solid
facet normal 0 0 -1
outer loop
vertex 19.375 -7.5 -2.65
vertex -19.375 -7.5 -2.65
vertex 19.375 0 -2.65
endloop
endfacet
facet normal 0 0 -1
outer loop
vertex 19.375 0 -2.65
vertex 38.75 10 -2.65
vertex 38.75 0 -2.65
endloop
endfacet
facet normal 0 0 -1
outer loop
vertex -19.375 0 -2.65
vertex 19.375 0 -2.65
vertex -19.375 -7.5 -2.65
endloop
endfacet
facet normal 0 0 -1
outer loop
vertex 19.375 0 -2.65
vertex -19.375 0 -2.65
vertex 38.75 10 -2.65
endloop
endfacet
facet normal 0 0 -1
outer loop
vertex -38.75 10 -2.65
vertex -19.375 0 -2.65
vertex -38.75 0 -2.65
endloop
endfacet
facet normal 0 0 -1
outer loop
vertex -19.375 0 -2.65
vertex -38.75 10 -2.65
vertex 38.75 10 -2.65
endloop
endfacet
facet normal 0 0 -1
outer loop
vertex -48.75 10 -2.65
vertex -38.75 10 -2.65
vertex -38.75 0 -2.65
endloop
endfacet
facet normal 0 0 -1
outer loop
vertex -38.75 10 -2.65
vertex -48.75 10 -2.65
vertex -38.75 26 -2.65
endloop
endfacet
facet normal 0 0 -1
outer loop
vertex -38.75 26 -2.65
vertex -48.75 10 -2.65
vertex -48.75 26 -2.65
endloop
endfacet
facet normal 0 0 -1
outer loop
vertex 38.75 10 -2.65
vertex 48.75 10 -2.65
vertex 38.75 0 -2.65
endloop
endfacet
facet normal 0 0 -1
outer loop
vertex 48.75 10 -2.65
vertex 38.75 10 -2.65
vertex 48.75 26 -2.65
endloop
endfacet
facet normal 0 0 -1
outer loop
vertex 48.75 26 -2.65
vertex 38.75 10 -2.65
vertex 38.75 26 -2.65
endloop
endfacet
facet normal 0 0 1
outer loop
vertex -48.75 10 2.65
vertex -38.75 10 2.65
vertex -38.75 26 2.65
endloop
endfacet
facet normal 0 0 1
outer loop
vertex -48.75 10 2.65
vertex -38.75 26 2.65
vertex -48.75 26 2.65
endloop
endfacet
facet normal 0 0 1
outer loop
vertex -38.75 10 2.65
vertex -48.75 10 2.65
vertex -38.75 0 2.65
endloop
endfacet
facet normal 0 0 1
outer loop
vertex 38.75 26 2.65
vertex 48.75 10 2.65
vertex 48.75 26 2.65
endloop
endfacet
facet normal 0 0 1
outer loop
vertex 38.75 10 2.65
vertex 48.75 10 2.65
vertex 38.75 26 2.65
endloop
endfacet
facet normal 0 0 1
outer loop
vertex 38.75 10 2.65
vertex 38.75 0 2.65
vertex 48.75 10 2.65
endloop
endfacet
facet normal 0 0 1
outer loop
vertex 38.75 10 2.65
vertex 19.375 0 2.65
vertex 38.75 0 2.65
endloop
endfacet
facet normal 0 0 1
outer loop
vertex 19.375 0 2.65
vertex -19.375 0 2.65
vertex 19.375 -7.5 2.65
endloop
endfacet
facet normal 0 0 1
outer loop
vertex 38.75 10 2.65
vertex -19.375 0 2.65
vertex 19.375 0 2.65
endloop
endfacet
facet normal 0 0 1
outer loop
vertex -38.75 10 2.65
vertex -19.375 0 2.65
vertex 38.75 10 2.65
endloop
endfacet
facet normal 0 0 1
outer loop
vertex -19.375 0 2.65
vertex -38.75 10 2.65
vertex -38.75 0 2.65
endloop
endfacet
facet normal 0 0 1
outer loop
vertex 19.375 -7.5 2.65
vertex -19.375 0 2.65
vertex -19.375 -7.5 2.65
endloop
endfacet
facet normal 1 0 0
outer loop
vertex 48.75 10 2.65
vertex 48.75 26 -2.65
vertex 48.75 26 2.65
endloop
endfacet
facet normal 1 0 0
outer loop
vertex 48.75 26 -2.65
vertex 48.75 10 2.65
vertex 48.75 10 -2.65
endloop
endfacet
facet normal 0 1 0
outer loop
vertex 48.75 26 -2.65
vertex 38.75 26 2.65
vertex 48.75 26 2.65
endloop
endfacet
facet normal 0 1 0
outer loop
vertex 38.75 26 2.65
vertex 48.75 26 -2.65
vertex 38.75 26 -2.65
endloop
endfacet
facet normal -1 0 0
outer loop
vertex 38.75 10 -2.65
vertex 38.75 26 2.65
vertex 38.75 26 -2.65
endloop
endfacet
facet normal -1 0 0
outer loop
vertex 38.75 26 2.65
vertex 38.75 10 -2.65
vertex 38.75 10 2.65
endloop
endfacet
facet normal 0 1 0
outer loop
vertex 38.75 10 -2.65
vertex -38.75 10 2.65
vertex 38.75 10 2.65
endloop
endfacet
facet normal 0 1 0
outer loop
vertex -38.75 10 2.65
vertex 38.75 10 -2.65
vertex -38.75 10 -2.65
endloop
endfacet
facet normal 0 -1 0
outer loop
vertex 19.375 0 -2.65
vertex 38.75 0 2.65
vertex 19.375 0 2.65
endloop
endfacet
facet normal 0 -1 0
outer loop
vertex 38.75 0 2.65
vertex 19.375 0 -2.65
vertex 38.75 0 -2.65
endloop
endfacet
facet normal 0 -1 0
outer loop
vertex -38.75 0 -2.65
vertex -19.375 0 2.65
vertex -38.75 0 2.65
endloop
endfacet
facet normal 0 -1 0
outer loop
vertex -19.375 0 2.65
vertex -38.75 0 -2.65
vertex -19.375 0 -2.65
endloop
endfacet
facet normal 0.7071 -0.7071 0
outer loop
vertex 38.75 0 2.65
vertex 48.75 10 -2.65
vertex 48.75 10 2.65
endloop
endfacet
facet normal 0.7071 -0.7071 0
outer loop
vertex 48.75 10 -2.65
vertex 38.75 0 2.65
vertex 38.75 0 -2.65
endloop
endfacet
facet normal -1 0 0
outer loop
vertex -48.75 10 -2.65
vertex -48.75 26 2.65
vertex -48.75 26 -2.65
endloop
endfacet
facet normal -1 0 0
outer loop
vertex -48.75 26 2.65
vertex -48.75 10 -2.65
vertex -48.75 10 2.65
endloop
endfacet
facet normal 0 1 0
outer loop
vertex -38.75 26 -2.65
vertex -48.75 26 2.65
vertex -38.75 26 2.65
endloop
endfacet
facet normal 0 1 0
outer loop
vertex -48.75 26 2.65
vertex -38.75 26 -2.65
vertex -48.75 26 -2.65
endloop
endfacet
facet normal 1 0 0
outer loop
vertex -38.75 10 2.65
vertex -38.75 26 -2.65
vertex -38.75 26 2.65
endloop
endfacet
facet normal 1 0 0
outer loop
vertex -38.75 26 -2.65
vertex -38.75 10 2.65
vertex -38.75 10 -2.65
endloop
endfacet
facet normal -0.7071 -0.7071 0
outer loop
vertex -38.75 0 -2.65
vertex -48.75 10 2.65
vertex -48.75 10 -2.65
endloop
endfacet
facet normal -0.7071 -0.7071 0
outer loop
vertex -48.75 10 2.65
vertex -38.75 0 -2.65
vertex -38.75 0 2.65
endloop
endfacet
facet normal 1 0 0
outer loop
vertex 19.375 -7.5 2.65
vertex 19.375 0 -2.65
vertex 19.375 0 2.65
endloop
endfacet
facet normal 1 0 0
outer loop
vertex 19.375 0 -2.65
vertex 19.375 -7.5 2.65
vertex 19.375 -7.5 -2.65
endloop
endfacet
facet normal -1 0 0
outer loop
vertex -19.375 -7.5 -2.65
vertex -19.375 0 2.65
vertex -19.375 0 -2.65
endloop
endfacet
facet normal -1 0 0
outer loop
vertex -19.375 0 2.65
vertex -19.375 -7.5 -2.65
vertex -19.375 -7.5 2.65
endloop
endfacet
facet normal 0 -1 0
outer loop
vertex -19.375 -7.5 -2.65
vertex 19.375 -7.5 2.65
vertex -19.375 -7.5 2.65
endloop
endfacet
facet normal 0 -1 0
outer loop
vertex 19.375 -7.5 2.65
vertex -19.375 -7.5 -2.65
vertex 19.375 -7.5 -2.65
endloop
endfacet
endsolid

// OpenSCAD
/**
 * A phone holder that is lodged into the CD tray of the car's dashboard.
 */

// Figuring out the pinch is the hard part. Different cases have different
// levels of squishy.
pinch=0.5;
// Phone width needs to be measured down to a 10th of a milimeter.
phoneWidth=82 - pinch;
phoneThickness=16;
phoneWidth=78 - pinch;
phoneHeight=phoneWidth * 16 / 10;
phoneArmWidth=10;
phoneArmGraspThickness = 10;
phoneArmDepth=phoneThickness + phoneArmGraspThickness;
cdTrayWidth=phoneWidth / 2;
// Measured at 5.30, but 5.00 on a slot that fits there rather well.
cdTrayHeight=5.3;
cdTrayDepth=15;

module cdTraySlot() {
  cube([
    cdTrayWidth,
    cdTrayDepth,
    cdTrayHeight,
  ], center=true);
}

module clawArm() {
  translate([0, 0, cdTrayHeight / -2])
    linear_extrude(cdTrayHeight)
    polygon([
      [0, 0],
      [phoneWidth / 2, 0],
      [phoneWidth / 2 + phoneArmWidth, phoneArmWidth],
      [phoneWidth / 2 + phoneArmWidth, phoneArmDepth],
      [phoneWidth / 2, phoneArmDepth],
      [phoneWidth / 2, phoneArmWidth],
      [0, phoneArmWidth],
      [0, 0],
    ]);
}

module claws() {
  clawArm();
  rotate([0, 180, 0])
    clawArm();
}

cdTraySlot();

claws();
